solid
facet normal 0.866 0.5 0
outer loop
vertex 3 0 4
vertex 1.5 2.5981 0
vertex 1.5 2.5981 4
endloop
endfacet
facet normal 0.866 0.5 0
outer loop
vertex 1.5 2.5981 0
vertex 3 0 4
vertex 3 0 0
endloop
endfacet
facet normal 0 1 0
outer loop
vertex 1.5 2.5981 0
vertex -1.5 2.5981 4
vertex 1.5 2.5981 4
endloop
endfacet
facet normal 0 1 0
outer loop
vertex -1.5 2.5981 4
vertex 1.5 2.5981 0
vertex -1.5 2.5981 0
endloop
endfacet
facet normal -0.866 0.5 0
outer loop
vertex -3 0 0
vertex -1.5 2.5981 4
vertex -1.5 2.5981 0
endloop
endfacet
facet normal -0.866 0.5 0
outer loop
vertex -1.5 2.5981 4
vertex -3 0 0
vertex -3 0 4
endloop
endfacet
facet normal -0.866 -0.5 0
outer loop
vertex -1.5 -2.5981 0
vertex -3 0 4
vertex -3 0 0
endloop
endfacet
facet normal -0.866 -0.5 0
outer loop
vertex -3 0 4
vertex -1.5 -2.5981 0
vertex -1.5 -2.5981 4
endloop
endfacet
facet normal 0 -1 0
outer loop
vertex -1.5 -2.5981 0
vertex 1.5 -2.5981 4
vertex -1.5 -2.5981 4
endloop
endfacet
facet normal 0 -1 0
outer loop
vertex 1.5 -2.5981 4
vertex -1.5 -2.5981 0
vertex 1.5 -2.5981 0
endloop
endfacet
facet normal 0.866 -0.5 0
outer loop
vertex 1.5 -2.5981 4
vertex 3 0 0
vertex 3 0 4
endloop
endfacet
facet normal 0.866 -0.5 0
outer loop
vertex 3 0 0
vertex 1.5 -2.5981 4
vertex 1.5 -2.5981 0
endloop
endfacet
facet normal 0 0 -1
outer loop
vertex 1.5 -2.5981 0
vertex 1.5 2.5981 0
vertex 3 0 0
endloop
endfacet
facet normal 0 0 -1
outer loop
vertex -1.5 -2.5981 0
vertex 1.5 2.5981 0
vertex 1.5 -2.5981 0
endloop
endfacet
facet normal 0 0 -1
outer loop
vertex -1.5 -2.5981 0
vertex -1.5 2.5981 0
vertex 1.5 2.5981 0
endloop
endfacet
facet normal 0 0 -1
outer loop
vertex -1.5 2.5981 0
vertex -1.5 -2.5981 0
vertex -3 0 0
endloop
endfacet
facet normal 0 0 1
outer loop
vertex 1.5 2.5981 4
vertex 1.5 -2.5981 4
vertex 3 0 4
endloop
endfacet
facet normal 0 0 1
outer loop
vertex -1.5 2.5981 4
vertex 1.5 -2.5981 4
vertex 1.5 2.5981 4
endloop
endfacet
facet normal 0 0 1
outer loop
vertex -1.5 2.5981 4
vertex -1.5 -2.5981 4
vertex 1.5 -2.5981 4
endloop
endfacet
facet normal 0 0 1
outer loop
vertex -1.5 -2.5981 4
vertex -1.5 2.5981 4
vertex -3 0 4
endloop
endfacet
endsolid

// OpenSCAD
standoff(d = 6, h = 4);

module standoff(d = 6, h = 4) {
    cylinder(d = d, h = h, $fn = 6);
    // cut the threads.
}
